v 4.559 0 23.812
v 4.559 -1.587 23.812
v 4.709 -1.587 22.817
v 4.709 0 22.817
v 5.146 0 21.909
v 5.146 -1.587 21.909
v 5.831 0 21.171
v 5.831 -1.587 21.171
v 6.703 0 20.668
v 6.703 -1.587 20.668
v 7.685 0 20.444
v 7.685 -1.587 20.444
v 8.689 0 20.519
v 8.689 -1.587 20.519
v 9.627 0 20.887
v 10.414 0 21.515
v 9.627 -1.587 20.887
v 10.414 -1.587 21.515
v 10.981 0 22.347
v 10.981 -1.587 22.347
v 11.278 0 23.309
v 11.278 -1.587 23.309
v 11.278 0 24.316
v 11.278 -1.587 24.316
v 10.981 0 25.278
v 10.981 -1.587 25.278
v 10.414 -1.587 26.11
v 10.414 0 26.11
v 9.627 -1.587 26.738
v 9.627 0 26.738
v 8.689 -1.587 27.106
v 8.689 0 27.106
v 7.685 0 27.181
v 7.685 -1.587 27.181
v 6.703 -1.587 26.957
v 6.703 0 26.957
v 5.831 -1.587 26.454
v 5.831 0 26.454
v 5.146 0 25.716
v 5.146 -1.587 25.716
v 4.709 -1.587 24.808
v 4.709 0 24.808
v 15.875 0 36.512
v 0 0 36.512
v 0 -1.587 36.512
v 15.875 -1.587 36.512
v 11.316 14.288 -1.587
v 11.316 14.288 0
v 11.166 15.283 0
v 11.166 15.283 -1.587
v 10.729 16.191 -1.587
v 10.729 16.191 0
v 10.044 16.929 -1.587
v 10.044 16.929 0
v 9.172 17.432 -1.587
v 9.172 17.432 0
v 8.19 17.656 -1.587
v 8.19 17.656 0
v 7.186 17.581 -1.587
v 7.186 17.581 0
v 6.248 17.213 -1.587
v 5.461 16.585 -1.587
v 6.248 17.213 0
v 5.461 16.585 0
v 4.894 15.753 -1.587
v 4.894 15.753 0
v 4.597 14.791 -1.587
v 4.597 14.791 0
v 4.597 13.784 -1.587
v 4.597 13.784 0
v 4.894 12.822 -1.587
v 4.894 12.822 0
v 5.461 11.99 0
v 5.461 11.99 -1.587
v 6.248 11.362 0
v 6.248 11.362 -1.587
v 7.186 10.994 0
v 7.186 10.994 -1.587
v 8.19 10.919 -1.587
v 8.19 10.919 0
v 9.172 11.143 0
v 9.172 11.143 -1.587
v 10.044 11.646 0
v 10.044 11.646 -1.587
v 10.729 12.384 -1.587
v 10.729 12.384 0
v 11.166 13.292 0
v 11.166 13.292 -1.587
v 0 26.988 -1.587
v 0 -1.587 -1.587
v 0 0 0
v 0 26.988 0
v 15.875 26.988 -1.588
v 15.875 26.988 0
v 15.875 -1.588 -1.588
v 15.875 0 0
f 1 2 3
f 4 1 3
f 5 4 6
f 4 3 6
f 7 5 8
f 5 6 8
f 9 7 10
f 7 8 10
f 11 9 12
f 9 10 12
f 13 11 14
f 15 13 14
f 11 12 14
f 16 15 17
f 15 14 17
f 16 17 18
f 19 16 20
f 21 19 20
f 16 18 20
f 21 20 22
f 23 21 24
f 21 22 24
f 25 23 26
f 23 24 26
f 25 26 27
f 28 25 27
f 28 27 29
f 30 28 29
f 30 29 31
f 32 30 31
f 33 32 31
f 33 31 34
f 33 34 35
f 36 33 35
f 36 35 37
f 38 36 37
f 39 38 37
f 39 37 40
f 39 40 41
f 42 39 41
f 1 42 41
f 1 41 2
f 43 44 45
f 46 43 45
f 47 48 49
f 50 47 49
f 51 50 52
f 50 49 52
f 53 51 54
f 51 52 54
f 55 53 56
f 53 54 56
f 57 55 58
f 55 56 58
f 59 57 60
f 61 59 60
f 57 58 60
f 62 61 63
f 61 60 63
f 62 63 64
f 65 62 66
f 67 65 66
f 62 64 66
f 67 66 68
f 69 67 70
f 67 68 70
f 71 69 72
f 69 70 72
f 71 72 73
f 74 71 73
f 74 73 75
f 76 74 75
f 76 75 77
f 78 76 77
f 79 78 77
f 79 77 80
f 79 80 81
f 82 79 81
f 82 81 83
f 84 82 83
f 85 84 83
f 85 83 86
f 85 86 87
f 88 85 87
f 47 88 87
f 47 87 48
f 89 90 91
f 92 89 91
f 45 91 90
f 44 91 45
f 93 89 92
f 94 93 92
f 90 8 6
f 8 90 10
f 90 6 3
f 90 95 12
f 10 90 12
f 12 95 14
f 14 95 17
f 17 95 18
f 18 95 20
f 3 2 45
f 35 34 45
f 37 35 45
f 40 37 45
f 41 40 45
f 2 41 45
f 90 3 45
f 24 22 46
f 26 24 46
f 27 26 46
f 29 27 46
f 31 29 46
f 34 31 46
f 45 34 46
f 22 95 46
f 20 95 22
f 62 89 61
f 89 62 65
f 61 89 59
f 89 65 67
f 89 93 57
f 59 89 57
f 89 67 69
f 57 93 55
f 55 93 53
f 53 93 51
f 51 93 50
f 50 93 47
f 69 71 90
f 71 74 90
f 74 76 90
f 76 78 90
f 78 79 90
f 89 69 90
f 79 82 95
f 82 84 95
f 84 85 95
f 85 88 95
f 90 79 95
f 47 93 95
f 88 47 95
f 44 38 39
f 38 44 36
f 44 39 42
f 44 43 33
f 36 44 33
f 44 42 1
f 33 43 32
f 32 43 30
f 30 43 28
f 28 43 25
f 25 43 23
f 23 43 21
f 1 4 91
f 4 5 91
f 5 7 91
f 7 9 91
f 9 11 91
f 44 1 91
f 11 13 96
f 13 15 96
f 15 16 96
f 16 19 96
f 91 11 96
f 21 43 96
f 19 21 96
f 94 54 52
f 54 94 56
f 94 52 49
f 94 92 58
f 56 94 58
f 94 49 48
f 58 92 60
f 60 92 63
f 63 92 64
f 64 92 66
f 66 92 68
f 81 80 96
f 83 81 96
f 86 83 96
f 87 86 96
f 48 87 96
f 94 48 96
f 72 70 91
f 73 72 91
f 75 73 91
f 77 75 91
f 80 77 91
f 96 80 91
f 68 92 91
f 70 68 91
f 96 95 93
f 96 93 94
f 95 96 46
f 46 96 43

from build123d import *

# Parameters (mm, degrees)
BASE_FLANGE1_DEPTH      = 15.875
F_1_4_CLEARANCE_HOLE1_D = 6.7564
F_1_4_CLEARANCE_HOLE2_D = 6.7564
BOSS_EXTRUDE1_DEPTH     = 15.875
CUT_EXTRUDE1_DEPTH      = 49.098892269
BOSS_EXTRUDE2_DEPTH     = 1.5875
BOSS_EXTRUDE3_DEPTH     = 1.5875


# Read off the part's stored shape, not the designer's step: Base-Flange1
with BuildPart() as part:
    # Base-Flange1 outline → Base-Flange1 (new body)
    with BuildSketch(Plane(origin=(0, 0, 0), x_dir=(0, 0, -1), z_dir=(1, 0, 0))):
        with BuildLine():
            Line((1.5875, 0.79375), (1.5875, 26.9875))
            Line((1.5875, 26.9875), (0, 26.9875))
            Line((0, 26.9875), (0, 0.79375))
            ThreePointArc((0, 0.79375), (-0.232483992, 0.232483992), (-0.79375, 0))
            Line((-0.79375, 0), (-36.5125, 0))
            Line((-36.5125, 0), (-36.5125, -1.5875))
            Line((-36.5125, -1.5875), (-0.79375, -1.5875))
            ThreePointArc((-0.79375, -1.5875), (0.890048023, -0.890048023), (1.5875, 0.79375))
        make_face()
    extrude(amount=BASE_FLANGE1_DEPTH)

    # 1/4 Clearance Hole1 (through all)
    with Locations(Plane(origin=(0, 0, -1.5875), x_dir=(-1, 0, 0), z_dir=(0, 0, -1))):
        with Locations((-7.9375, 14.2875)):
            Hole(F_1_4_CLEARANCE_HOLE1_D / 2)

    # 1/4 Clearance Hole2 (through all)
    with Locations(Plane(origin=(0, 0, 0), x_dir=(1, 0, 0), z_dir=(0, 1, 0))):
        with Locations((7.9375, -23.8125)):
            Hole(F_1_4_CLEARANCE_HOLE2_D / 2)

    # Sketch11 → Boss-Extrude1 (add, through all)
    with BuildSketch(Plane(origin=(15.875, 0, 0), x_dir=(0, 0, -1), z_dir=(1, 0, 0))):
        with BuildLine():
            Line((1.5875, 0.79375), (1.5875, -1.5875))
            Line((1.5875, -1.5875), (-0.79375, -1.5875))
            ThreePointArc((-0.79375, -1.5875), (0.890048023, -0.890048023), (1.5875, 0.79375))
        make_face()
    extrude(amount=-BOSS_EXTRUDE1_DEPTH)

    # Sketch12 → Cut-Extrude1 (cut, through all)
    with BuildSketch(Plane(origin=(15.875, 0, 0), x_dir=(0, 0, -1), z_dir=(1, 0, 0))):
        with BuildLine():
            Line((-0.79375, 0), (0, 0))
            Line((0, 0), (0, 0.79375))
            ThreePointArc((0, 0.79375), (-0.232483992, 0.232483992), (-0.79375, 0))
        make_face()
    extrude(amount=-CUT_EXTRUDE1_DEPTH, mode=Mode.SUBTRACT)

    # Sketch13 → Boss-Extrude2 (add)
    with BuildSketch(Plane(origin=(15.875, 0, 0), x_dir=(0, 0, -1), z_dir=(1, 0, 0))):
        Polygon((0, 0), (0, 26.9875), (1.5875, 26.9875), (1.5875, -1.5875), (-36.5125, -1.5875), (-36.5125, 0), align=None)
    extrude(amount=-BOSS_EXTRUDE2_DEPTH)

    # Sketch14 → Boss-Extrude3 (add)
    with BuildSketch(Plane.ZY):
        Polygon((0, 0), (0, 26.9875), (-1.5875, 26.9875), (-1.5875, -1.5875), (36.5125, -1.5875), (36.5125, 0), align=None)
    extrude(amount=-BOSS_EXTRUDE3_DEPTH)


solid = part.part
